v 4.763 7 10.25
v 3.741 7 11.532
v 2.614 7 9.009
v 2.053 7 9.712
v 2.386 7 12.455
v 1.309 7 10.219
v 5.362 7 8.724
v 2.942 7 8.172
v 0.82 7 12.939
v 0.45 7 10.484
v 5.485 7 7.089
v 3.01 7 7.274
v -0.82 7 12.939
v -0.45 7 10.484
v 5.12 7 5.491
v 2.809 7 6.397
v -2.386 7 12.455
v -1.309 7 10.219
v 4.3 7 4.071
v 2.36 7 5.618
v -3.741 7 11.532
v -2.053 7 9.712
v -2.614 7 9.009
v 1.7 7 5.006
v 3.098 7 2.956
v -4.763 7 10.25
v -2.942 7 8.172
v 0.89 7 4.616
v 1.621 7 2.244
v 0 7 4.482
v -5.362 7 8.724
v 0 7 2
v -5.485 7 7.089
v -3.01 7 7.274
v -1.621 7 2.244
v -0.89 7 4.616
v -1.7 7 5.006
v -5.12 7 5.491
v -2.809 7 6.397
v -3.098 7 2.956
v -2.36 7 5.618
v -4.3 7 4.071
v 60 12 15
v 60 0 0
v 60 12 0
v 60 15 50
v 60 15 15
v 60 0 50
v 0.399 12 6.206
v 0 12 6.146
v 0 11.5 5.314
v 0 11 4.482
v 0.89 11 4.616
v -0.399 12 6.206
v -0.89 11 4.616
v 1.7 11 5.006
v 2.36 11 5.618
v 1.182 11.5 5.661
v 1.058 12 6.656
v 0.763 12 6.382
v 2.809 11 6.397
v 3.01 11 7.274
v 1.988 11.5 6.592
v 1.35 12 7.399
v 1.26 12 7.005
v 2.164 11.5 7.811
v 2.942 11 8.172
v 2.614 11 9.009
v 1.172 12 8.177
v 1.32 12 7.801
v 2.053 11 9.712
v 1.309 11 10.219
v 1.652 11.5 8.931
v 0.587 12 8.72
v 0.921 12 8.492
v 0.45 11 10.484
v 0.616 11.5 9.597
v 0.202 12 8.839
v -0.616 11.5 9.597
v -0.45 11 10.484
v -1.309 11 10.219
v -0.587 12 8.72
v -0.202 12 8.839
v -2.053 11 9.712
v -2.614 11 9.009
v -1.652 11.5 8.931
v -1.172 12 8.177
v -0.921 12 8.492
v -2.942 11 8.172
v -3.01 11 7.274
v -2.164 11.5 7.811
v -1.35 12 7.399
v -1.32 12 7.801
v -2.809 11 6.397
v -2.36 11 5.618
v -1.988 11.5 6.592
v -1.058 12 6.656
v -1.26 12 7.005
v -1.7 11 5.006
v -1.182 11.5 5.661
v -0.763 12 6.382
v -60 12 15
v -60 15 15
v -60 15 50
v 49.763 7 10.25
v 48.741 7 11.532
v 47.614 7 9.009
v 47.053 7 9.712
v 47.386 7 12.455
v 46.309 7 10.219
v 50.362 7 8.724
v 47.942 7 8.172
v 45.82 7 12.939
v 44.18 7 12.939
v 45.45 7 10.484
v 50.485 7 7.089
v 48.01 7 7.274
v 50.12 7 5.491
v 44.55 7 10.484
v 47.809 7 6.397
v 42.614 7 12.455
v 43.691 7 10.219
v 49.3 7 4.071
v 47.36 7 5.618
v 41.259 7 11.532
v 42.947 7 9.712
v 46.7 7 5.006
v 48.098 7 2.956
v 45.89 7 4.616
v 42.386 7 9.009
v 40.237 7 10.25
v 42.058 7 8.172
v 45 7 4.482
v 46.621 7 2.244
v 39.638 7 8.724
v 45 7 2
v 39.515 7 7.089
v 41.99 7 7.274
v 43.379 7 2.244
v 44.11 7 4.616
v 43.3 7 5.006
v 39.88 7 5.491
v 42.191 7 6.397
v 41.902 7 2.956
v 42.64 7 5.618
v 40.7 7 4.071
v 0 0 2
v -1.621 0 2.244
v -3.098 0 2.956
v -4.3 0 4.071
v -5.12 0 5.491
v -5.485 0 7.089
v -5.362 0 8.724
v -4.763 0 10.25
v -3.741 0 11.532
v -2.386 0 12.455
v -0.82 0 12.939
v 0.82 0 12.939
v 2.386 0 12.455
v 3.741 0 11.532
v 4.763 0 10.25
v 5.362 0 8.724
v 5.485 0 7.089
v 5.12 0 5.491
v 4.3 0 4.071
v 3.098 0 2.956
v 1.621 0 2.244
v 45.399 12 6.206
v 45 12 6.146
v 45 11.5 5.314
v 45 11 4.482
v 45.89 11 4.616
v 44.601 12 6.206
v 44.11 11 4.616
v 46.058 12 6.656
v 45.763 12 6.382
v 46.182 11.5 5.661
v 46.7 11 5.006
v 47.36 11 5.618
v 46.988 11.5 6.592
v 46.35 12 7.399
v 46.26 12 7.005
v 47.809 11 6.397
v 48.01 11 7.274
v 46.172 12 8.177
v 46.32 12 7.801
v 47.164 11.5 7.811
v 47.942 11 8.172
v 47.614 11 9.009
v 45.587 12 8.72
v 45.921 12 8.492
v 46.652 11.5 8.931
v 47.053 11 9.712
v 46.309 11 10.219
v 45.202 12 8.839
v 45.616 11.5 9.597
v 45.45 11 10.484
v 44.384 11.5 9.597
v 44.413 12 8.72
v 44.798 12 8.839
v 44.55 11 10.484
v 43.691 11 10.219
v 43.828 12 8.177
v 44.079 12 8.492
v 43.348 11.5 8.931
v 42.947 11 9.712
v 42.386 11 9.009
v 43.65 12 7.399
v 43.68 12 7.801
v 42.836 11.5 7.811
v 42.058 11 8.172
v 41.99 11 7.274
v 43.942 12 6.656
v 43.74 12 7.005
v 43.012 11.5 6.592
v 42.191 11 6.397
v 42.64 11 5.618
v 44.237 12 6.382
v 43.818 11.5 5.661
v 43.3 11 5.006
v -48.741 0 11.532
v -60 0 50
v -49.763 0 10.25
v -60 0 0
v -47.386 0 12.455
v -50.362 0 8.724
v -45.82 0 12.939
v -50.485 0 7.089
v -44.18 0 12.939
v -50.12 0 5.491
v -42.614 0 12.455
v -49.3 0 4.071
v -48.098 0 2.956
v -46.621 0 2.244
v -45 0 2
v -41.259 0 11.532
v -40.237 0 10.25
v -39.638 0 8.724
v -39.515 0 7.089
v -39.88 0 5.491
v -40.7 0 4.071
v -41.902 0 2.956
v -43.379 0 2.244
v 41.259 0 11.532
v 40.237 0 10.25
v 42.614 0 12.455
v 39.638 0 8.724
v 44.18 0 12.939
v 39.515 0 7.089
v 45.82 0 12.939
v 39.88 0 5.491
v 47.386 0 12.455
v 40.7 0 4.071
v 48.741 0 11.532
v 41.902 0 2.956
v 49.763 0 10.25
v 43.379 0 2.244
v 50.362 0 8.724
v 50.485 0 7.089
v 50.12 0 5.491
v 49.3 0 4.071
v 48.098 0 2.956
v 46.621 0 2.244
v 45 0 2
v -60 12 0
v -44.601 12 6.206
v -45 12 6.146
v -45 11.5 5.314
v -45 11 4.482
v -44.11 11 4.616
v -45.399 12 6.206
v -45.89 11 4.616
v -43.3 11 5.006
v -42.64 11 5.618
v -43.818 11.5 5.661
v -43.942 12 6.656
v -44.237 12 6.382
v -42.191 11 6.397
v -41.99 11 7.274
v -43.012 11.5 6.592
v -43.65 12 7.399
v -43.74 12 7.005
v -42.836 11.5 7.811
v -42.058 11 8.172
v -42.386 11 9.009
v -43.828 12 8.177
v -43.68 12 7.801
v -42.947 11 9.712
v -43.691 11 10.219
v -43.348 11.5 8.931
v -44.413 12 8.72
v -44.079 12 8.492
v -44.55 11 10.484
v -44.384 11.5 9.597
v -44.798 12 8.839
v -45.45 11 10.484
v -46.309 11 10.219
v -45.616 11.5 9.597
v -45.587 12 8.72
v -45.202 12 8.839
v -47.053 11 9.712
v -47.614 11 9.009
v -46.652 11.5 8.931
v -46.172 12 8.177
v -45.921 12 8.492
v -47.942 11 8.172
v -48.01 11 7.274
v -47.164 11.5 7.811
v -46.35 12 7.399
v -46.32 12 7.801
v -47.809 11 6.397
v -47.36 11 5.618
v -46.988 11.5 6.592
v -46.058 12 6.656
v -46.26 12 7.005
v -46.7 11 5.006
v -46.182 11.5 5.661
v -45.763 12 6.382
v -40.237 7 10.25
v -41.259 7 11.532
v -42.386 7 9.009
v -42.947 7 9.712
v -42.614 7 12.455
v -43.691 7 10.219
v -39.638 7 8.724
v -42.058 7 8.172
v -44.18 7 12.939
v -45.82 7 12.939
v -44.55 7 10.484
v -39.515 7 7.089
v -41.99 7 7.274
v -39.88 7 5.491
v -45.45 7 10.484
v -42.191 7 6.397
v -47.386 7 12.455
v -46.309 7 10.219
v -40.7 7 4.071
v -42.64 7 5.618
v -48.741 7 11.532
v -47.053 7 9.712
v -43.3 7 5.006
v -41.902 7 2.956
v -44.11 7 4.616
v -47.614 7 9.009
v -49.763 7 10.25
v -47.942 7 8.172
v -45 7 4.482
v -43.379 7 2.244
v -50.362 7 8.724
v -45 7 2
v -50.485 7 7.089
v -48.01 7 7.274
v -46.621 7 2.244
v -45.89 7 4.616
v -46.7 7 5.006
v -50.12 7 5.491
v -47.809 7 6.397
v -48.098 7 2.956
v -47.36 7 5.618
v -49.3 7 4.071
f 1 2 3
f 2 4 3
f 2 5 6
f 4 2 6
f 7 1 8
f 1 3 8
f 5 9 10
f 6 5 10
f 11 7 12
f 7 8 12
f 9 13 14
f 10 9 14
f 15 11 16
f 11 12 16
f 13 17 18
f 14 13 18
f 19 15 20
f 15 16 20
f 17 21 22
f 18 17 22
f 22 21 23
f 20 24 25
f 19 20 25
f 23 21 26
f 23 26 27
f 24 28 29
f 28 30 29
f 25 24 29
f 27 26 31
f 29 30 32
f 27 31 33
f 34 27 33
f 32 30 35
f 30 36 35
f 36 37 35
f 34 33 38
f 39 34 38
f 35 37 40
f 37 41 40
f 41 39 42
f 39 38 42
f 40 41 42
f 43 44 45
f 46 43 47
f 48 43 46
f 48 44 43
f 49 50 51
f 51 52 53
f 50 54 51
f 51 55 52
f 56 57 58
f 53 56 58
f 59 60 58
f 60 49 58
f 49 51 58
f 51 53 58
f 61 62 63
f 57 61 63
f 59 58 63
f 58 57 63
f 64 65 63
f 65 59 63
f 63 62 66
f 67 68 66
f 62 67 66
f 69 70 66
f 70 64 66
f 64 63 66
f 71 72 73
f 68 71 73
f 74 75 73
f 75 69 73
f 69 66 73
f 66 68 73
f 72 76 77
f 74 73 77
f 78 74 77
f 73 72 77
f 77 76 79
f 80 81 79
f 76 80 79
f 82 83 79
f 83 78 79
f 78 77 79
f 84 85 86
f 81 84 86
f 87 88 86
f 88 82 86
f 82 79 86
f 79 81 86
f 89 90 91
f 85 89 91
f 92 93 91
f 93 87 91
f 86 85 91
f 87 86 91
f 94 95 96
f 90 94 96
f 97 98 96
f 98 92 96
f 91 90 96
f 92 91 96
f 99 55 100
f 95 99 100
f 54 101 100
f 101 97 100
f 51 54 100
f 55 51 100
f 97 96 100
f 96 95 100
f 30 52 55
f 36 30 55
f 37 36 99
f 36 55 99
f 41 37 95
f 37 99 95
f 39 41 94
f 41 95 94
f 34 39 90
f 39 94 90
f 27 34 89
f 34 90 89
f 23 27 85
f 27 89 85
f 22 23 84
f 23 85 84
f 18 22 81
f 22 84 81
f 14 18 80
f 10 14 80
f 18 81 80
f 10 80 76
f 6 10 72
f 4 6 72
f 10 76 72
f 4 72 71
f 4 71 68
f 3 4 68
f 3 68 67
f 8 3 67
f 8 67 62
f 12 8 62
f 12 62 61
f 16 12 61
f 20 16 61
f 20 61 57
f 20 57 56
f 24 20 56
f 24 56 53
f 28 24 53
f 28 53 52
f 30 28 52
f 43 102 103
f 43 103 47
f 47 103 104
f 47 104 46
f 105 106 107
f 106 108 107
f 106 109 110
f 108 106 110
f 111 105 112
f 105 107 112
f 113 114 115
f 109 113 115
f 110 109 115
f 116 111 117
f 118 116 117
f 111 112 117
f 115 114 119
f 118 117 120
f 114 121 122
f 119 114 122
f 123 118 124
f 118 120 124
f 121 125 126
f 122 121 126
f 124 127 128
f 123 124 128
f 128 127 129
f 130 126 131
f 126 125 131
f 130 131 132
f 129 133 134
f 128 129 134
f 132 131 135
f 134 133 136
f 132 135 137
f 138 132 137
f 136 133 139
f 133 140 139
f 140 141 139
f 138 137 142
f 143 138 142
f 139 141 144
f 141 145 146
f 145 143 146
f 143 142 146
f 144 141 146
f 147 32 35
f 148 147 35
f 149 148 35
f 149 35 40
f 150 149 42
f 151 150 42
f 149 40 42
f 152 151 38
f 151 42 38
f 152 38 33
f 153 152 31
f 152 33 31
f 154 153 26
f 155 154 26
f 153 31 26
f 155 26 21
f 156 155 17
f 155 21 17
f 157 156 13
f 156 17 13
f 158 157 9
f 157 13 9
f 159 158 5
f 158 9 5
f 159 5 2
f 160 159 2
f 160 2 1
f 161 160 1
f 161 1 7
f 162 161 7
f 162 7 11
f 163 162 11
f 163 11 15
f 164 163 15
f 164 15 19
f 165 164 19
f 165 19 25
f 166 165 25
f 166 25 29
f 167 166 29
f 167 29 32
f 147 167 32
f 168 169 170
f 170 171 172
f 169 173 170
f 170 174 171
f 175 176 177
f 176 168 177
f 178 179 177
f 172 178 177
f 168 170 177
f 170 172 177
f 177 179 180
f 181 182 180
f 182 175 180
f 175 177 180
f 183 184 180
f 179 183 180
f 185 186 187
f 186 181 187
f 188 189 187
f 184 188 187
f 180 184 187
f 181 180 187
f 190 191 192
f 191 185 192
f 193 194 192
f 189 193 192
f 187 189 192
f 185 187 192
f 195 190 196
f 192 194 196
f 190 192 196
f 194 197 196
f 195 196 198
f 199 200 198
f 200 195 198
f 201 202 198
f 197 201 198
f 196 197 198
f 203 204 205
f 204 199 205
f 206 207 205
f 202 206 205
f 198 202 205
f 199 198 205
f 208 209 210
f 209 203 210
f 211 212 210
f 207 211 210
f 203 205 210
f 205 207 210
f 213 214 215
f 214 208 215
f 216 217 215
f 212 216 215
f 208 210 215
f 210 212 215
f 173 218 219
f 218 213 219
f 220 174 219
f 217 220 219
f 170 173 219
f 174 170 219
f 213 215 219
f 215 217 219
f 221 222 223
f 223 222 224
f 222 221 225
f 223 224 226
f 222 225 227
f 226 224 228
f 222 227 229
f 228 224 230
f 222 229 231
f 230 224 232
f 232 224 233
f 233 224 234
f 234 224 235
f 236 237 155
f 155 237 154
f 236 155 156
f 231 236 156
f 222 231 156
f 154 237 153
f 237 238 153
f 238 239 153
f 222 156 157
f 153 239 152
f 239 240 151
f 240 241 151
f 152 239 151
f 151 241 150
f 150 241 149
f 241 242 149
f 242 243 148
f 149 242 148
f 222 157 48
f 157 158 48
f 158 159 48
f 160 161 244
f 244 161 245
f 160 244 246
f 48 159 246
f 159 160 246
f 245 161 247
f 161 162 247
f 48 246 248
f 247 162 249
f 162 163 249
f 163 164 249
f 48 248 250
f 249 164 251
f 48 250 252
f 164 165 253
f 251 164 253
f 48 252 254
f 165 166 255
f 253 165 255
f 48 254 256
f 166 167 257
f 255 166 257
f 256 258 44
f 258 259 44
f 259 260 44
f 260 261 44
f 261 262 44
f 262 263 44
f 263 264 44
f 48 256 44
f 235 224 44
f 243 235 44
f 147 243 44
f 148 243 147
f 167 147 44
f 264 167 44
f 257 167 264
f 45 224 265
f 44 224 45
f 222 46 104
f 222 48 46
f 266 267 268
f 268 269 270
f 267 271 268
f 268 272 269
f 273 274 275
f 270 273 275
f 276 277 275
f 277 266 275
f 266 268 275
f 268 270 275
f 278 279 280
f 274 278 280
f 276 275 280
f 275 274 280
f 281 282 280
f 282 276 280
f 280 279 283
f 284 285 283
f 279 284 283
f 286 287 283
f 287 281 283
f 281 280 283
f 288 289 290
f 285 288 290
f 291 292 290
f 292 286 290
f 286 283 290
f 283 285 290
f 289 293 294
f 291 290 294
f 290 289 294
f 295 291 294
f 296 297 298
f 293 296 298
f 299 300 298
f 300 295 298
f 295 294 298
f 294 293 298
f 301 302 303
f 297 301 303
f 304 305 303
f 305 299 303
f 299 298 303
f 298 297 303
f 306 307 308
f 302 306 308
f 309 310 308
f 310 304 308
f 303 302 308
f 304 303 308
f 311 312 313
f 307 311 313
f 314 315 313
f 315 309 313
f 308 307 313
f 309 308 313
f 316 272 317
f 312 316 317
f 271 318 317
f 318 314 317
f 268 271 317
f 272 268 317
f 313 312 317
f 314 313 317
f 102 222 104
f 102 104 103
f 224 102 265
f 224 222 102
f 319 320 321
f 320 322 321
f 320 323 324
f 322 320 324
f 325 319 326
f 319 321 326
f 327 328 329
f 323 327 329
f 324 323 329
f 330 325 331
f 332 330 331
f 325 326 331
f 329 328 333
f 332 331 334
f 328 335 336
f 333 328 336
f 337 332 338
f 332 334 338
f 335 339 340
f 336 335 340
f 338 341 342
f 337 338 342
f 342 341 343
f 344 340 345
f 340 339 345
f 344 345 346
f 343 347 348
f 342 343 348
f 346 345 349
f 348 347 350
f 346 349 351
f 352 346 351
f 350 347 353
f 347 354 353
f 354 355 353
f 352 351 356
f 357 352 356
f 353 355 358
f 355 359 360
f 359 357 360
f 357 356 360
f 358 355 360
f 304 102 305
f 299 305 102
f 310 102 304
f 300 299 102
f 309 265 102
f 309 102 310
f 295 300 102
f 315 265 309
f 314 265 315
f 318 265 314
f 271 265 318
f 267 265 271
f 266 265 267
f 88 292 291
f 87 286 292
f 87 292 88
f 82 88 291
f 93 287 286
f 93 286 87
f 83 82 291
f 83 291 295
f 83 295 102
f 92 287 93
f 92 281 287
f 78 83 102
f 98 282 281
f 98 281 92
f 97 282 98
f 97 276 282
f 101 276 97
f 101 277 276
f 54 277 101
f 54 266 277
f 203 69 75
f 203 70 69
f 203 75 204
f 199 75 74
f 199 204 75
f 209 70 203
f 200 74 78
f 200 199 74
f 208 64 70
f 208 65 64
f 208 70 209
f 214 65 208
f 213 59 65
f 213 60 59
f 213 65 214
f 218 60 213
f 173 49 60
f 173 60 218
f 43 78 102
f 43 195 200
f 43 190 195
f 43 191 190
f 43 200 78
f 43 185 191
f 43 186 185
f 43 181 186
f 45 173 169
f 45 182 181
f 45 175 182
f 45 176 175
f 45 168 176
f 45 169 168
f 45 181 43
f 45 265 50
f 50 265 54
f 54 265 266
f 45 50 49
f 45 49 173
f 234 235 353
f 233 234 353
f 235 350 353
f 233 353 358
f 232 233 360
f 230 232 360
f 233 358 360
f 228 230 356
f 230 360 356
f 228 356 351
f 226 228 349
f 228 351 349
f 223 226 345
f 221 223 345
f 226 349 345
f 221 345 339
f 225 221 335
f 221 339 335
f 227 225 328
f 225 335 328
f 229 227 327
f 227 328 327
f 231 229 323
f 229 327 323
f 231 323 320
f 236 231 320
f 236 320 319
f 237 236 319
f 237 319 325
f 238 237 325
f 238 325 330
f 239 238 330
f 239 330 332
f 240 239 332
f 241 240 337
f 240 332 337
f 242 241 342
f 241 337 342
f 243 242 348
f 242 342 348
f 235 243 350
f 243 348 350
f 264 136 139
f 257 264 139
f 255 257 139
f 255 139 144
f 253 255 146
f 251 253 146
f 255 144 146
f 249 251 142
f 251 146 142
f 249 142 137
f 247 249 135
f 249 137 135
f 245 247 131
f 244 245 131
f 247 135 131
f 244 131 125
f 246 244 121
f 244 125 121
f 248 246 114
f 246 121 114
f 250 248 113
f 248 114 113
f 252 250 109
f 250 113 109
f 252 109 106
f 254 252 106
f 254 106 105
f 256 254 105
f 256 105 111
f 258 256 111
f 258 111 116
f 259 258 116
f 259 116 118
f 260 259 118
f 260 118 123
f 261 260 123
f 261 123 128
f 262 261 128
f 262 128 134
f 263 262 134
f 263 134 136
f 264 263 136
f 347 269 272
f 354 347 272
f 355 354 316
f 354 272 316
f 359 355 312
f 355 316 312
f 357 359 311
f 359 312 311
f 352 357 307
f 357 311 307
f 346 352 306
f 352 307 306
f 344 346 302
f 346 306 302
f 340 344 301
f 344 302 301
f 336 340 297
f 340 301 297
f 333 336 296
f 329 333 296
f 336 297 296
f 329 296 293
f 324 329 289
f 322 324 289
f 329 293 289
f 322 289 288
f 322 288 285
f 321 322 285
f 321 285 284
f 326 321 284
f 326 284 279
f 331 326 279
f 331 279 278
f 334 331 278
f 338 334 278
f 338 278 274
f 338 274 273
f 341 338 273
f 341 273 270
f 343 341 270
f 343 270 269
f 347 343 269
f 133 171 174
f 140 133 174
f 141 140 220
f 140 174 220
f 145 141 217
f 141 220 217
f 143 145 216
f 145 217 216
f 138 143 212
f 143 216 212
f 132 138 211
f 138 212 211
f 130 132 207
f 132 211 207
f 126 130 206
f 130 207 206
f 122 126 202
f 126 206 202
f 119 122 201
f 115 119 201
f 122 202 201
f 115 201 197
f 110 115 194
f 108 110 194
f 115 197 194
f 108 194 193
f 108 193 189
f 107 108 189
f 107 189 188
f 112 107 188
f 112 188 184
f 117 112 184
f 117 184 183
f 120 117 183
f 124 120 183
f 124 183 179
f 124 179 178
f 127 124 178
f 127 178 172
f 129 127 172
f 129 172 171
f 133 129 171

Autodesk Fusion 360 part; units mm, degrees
sketch "Sketch1" plane through (0, 0, 0) normal (0, 1, 0) x (1, 0, 0)
  line L0 (-60, 0) -> (60, 0)
  line L1 (60, 0) -> (60, -50)
  line L2 (60, -50) -> (-60, -50)
  line L3 (-60, -50) -> (-60, 0)
  line L4 (-60, -15) -> (60, -15)
  dimension "d1" = 120
  dimension "d2" = 50
  dimension "d3" = 15
extrude "Extrude1" add sketch "Sketch1" along normal blind 15 contours L1 L2 L3 L4
extrude "Extrude2" add sketch "Sketch1" along normal blind 12 contours L0 L1 L3 L4
sketch "Sketch4" plane through (0, 0, 0) normal (0, -1, 0) x (1, 0, 0)
  line L0 (-60, 0) -> (-60, 15)
  line L1 (-60, 7.5) -> (-45, 7.5)
  line L2 (-60, 0) -> (60, 0)
  line L3 (-45, 7.5) -> (0, 7.5)
  line L4 (0, 7.5) -> (45, 7.5)
  line L5 (60, 15) -> (60, 0)
  line L6 (45, 7.5) -> (60, 7.5)
  dimension "d9" = 15
  dimension "d10" = 7.5
  dimension "d11" = 45
  dimension "d12" = 45
hole "Hole1" at (-45, 0, 7.5) at (45, 0, 7.5) at (0, 0, 7.5) direction (0, 1, 0) diameter 6.036 depth 11 tip angle 118 counterbore diameter 11 counterbore depth 7
